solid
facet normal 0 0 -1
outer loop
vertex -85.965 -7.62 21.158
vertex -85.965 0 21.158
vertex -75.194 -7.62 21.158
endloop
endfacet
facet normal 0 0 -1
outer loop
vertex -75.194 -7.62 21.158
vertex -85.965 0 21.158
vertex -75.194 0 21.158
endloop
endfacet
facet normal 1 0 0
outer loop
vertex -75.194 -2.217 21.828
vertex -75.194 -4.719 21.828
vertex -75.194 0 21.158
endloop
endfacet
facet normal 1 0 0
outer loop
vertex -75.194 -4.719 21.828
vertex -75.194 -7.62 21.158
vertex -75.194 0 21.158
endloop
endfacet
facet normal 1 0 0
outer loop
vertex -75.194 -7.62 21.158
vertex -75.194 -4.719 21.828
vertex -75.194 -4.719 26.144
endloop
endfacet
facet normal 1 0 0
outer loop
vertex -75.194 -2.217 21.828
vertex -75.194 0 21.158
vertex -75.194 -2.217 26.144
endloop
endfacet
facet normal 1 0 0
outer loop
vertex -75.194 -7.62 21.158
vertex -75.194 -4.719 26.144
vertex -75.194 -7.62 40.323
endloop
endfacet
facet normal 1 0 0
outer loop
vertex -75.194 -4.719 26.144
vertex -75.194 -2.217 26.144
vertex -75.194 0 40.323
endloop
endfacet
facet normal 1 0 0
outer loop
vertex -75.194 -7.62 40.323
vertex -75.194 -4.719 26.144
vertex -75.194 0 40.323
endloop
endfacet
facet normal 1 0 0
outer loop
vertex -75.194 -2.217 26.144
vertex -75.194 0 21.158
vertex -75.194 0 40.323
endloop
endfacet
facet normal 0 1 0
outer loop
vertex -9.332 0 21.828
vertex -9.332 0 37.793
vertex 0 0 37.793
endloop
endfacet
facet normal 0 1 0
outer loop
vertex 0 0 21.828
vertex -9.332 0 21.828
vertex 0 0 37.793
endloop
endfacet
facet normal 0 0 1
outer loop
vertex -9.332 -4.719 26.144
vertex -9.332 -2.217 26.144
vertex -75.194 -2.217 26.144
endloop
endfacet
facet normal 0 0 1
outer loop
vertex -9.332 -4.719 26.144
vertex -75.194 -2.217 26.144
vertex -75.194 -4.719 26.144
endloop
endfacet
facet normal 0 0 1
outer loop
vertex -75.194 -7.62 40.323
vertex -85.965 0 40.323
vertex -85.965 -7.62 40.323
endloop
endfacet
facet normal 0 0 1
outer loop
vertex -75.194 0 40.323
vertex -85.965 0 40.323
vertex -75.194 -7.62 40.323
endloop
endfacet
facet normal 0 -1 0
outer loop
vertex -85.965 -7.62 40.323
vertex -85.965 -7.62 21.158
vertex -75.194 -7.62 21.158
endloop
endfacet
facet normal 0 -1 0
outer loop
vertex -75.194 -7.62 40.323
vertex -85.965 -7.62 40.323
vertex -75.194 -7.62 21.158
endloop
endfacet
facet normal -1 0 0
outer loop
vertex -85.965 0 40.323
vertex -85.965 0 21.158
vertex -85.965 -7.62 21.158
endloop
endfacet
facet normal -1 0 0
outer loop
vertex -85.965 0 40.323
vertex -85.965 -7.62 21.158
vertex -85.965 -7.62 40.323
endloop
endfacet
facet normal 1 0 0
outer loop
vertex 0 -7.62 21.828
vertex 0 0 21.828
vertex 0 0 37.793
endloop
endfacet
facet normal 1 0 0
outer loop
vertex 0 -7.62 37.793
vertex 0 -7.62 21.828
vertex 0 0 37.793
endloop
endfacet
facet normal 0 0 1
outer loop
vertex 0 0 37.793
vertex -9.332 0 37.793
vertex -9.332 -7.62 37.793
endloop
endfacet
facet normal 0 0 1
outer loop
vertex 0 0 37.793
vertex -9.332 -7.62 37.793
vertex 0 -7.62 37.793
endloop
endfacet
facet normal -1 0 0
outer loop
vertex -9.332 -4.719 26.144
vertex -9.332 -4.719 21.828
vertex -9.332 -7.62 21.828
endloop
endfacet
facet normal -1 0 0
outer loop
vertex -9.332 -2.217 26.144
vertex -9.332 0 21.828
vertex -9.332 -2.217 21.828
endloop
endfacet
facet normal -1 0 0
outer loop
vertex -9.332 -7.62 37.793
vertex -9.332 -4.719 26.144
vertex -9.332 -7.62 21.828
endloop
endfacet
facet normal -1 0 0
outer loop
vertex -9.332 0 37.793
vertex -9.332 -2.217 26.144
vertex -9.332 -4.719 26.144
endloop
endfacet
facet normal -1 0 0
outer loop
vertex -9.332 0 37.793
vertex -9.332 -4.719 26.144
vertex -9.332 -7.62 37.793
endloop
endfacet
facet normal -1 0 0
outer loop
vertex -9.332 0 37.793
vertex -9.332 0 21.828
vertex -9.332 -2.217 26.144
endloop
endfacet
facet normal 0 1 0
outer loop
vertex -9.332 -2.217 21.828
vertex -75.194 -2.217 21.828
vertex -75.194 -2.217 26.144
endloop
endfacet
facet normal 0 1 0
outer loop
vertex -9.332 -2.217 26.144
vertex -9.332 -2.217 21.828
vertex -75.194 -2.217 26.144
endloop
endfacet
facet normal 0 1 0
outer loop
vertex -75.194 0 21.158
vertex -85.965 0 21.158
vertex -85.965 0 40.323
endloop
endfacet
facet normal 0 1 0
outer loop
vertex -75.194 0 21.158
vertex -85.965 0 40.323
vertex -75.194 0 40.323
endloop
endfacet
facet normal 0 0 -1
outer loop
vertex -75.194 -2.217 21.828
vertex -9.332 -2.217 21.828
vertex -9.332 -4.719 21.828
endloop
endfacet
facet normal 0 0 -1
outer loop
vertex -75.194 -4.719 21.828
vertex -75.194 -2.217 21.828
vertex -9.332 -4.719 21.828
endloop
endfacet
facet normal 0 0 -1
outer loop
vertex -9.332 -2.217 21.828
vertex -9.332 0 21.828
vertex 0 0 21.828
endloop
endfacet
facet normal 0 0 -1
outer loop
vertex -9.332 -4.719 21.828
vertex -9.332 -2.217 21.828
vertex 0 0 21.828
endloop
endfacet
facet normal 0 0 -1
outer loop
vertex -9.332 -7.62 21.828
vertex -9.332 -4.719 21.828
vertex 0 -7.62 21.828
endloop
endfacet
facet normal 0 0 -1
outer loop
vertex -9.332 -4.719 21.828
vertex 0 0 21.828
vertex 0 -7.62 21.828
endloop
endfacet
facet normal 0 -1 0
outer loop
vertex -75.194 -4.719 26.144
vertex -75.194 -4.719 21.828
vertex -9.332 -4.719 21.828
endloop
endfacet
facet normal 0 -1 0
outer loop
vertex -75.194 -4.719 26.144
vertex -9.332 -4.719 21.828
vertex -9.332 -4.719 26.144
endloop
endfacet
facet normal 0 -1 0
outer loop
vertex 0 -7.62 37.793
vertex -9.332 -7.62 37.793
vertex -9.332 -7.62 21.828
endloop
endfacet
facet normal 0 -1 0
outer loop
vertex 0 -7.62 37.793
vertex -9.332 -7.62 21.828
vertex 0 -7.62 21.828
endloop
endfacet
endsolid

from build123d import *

# Parameters (mm, degrees)
F0_W     = 9.3324817717
F0_H     = 15.9647651017
F1_DEPTH = 7.62
F2_W     = 2.5024851784
F2_H     = 4.3162275106
F3_DEPTH = 25.4
F4_DEPTH = 25.4
F5_DEPTH = 25.4
F6_W     = 10.77144593
F6_H     = 19.1651917994
F7_DEPTH = 7.62


with BuildPart() as f1:
    # F0 (on Front) → F1 (new body)
    with BuildSketch(Plane.XZ):
        with Locations((-4.6662408859, 29.8102106899)):
            Rectangle(F0_W, F0_H)
    extrude(amount=F1_DEPTH)

    # F2 (on face) → F3 (join)
    with BuildSketch(Plane(origin=(-9.3324817717, 0, 0), x_dir=(0, -1, 0), z_dir=(-1, 0, 0))):
        with Locations((3.4680166282, 23.9859418944)):
            Rectangle(F2_W, F2_H)
    extrude(amount=F3_DEPTH)

    # F4 (add): a face of the model
    f4_faces = [f1.faces().sort_by_distance(p)[0] for p in [
        (-34.7324817717, -3.4680166282, 23.9859418944),
    ]]
    extrude(f4_faces, amount=F4_DEPTH)

    # F5 (add): a face of the model
    f5_faces = [f1.faces().sort_by_distance(p)[0] for p in [
        (-60.1324817717, -3.4680166282, 23.9859418944),
    ]]
    extrude(f5_faces, amount=F5_DEPTH)

    # F6 (on Front) → F7 (join)
    with BuildSketch(Plane.XZ):
        with Locations((-80.5792994797, 30.7407360524)):
            Rectangle(F6_W, F6_H)
    extrude(amount=F7_DEPTH)


solid = f1.part
